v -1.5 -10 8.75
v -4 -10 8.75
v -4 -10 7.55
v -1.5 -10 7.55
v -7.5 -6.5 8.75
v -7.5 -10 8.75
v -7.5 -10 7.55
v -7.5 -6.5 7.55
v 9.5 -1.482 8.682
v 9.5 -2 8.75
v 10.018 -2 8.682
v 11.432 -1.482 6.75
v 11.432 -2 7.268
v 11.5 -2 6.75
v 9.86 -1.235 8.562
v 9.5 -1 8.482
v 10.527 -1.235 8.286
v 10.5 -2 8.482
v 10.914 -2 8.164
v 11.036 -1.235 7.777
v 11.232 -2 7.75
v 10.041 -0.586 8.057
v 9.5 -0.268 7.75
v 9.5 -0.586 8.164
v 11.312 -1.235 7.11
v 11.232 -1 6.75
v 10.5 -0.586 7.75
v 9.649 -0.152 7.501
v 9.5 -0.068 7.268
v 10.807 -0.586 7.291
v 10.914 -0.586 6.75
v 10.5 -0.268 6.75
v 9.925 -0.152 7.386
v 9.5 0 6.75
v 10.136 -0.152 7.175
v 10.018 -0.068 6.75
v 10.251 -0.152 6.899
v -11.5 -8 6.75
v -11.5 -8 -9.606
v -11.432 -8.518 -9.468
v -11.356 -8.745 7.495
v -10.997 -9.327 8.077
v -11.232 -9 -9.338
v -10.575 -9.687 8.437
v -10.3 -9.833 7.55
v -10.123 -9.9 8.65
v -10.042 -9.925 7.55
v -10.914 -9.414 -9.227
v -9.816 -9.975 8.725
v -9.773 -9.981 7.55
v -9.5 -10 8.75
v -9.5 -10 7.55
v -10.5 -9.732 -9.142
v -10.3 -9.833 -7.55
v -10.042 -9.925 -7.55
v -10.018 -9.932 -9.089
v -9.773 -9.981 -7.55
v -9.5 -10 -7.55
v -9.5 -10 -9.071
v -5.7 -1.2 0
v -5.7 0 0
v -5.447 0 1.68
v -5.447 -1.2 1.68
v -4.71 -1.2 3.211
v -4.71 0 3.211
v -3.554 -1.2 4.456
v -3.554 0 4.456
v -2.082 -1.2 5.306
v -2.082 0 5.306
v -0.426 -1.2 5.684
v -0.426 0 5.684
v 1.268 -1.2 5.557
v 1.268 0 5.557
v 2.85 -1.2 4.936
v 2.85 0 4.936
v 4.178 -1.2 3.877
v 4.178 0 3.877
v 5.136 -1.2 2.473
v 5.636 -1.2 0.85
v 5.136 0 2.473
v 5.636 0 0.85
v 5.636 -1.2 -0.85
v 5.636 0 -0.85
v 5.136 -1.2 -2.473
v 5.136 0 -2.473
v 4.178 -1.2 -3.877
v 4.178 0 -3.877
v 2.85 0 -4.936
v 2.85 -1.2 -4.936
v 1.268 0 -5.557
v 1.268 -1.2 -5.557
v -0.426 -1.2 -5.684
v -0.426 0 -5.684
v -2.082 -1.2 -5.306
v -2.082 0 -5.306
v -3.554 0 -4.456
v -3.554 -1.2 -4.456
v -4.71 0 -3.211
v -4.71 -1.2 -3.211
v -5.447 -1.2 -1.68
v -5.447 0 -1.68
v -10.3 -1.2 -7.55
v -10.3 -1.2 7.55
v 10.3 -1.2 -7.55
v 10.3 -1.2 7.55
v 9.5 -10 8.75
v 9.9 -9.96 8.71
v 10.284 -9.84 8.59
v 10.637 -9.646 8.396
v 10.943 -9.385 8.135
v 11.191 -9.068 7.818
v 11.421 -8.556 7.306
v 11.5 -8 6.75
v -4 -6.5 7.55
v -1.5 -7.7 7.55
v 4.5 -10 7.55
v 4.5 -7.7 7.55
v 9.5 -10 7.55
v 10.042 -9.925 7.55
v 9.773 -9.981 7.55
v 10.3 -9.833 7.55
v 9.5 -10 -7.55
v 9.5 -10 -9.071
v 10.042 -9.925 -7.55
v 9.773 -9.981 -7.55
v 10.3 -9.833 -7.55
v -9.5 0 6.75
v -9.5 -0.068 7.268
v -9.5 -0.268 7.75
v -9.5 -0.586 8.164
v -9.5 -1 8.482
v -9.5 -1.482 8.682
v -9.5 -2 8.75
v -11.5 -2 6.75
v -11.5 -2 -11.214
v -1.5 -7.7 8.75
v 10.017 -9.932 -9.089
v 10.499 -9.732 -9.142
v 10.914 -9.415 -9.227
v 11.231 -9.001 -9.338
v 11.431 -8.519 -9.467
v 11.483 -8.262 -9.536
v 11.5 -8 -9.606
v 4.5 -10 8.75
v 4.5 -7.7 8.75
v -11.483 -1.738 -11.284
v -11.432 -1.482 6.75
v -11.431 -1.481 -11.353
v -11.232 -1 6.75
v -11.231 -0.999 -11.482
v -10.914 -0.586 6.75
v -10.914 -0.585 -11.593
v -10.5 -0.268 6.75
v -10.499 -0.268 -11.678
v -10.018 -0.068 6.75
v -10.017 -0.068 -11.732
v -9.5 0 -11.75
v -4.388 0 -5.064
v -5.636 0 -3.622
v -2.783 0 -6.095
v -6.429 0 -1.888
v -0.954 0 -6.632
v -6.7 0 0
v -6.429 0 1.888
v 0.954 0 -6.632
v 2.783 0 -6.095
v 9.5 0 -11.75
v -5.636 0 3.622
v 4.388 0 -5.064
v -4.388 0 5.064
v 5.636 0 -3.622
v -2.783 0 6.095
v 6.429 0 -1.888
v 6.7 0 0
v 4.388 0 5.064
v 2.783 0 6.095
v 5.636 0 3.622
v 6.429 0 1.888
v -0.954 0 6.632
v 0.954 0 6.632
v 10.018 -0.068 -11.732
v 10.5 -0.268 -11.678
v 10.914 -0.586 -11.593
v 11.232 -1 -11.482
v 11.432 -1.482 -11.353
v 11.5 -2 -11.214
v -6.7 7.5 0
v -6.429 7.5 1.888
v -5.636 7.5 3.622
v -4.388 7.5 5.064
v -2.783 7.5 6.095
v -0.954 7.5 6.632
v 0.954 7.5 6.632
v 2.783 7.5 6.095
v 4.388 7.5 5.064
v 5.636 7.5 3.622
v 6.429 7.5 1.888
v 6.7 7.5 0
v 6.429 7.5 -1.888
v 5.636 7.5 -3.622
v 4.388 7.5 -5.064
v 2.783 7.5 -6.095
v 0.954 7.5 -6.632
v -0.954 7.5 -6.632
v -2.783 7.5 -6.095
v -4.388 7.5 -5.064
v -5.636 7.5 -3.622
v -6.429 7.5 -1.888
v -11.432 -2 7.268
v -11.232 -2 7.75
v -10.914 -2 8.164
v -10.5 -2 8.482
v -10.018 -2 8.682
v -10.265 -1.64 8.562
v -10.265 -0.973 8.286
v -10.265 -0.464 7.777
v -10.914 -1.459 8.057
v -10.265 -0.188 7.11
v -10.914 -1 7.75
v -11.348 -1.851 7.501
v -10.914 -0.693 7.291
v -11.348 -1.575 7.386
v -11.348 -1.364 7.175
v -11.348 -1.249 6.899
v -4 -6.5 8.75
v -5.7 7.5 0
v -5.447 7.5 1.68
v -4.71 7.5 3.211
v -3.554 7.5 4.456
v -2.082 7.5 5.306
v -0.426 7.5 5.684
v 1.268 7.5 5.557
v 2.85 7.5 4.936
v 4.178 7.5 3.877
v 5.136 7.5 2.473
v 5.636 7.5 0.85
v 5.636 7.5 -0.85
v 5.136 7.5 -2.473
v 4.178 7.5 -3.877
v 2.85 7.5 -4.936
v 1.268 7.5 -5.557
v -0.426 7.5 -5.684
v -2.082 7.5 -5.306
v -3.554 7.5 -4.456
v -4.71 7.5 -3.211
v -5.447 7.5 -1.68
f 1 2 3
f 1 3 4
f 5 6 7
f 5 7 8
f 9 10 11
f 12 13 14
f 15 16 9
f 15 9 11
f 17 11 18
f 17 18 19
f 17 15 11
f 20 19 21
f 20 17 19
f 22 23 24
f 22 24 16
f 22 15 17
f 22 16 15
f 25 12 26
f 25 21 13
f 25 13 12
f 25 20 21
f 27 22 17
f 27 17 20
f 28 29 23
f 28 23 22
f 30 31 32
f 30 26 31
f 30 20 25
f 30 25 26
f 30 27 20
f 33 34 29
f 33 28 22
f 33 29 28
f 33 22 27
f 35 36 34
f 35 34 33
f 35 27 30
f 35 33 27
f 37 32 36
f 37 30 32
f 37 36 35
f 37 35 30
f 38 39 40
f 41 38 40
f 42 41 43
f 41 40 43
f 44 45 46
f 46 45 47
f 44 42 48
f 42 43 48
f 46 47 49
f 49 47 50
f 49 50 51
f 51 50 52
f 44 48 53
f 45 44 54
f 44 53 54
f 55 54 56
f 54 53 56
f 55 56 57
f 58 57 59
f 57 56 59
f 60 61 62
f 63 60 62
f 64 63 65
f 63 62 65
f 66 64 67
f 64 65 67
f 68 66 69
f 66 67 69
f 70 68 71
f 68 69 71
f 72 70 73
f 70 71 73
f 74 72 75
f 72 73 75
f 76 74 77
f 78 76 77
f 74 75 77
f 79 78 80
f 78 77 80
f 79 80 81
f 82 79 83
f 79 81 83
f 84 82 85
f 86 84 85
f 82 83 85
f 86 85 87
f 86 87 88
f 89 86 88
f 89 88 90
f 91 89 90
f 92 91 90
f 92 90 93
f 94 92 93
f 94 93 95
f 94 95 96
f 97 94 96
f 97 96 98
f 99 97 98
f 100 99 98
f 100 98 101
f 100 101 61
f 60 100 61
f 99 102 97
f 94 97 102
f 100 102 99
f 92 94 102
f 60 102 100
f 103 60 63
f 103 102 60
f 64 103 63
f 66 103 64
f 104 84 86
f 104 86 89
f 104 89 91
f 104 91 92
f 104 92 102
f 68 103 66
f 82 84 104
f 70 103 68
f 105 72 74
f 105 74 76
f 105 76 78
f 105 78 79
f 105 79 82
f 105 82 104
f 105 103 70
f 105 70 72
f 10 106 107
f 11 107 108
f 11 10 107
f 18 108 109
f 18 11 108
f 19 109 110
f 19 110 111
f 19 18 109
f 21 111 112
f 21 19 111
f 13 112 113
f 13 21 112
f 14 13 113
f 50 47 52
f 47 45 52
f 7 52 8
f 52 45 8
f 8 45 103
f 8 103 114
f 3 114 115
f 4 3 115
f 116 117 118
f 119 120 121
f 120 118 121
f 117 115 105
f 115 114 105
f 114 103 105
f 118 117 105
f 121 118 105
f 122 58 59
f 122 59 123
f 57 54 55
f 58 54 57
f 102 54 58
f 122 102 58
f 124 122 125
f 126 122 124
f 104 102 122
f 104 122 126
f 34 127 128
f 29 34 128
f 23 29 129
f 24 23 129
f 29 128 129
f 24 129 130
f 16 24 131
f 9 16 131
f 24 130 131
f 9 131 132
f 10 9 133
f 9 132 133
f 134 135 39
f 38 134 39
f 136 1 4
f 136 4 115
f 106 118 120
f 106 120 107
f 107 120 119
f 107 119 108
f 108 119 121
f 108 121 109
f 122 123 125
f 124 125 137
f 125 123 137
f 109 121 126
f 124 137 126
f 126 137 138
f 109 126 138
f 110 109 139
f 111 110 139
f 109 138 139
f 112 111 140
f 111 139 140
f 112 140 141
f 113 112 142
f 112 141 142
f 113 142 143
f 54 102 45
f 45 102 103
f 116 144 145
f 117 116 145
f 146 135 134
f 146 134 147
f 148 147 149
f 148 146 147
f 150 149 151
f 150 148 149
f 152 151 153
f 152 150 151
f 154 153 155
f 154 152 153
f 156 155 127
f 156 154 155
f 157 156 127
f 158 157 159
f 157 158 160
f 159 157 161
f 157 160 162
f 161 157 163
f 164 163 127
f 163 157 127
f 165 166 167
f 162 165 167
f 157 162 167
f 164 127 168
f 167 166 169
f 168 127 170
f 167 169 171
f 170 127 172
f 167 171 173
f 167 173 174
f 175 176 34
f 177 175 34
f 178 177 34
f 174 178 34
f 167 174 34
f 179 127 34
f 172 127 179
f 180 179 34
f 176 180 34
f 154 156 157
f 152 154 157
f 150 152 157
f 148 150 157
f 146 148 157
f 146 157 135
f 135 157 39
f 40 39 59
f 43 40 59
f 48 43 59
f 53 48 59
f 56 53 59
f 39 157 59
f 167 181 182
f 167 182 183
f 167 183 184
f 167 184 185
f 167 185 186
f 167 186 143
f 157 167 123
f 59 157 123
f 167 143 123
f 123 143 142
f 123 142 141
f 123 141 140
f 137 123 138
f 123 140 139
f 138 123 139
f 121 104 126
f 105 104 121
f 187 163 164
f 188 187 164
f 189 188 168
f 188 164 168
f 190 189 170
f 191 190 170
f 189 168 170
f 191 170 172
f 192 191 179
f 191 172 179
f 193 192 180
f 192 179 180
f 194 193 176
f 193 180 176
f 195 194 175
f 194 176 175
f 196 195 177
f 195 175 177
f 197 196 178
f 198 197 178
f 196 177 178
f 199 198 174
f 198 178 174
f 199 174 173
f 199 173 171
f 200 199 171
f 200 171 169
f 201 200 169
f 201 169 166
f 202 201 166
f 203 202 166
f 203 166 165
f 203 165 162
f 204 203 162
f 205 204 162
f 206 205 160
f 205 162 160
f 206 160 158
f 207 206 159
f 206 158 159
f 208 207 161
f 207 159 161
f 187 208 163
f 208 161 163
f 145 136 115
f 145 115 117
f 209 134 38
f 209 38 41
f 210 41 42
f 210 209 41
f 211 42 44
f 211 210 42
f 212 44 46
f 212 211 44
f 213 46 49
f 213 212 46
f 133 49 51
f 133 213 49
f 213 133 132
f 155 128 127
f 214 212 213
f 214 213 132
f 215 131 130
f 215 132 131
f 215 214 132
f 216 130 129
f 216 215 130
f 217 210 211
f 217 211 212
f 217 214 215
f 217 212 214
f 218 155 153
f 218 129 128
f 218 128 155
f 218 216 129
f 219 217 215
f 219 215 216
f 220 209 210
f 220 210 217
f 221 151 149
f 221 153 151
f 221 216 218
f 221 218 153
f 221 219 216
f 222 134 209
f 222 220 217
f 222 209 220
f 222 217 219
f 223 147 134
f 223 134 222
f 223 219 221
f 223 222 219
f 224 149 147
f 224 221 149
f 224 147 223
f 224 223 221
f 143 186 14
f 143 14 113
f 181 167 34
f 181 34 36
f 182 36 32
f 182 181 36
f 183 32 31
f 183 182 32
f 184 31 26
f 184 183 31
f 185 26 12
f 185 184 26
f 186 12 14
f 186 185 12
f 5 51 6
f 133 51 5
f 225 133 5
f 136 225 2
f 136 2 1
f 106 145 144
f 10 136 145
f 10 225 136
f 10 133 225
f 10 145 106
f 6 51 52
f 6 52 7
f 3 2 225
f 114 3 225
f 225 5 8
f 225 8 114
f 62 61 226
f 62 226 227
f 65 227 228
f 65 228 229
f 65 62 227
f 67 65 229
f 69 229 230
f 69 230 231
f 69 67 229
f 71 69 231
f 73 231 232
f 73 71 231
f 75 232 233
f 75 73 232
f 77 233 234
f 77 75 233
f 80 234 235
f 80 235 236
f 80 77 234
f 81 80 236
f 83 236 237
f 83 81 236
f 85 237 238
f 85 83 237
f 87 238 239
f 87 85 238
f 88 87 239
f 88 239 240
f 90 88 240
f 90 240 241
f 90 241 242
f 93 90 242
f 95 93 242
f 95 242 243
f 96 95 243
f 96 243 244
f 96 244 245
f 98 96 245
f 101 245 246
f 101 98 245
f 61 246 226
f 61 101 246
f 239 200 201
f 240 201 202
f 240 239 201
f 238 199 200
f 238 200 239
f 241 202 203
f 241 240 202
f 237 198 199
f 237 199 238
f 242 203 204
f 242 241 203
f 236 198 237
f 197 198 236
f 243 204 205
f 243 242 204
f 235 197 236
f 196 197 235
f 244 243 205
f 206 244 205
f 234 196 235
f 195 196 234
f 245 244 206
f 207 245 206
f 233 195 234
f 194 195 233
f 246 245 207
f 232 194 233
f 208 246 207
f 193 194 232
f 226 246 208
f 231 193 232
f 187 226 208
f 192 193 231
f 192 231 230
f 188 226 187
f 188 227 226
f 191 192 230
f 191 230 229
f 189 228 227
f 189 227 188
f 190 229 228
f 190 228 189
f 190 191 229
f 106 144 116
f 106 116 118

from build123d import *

# Parameters (mm, degrees)
F0_W          = 23
F0_H          = 17.5
F1_DEPTH      = 10
F2_T          = -1.2
F3_R          = 5.7
F4_DEPTH      = 3
F3_R_2        = 6.7
F5_DEPTH      = 7.5
F6_W          = 6
F6_H          = 2.3
F6_W_2        = 3.5
F6_H_2        = 3.5
F7_DEPTH      = 4
F8_DEPTH      = 3
F10_DEPTH     = 30
F11_T1_DEPTH  = 19
F11_T3_DEPTH  = 23.5
F11_T5_DEPTH  = 13
F11_T7_DEPTH  = 27.8205080757
F11_S11_W     = 2
F11_S11_H     = 2
F11_T12_DEPTH = 2
F11_S17_W     = 2
F11_S17_H     = 2
F11_T18_DEPTH = 2


# Not quite as in the source:
# - a fillet or chamfer that OpenCascade refuses, or shapes differently, is made with other operations: its cross-section is extruded or revolved along the edge and cut away or added


with BuildPart() as f1:
    # F0 (on Front) → F1 (new body)
    with BuildSketch(Plane.XZ):
        Rectangle(F0_W, F0_H)
    extrude(amount=F1_DEPTH)

    # F2
    f2_openings = [f1.faces().sort_by_distance(p)[0] for p in [
        (0, -10, 0),
    ]]
    offset(amount=F2_T, openings=f2_openings)

    # F3 (on face) → F4 (cut)
    with BuildSketch(Plane(origin=(0, 0, 0), x_dir=(-1, 0, 0), z_dir=(0, 1, 0))):
        Circle(F3_R)
    extrude(amount=-F4_DEPTH, mode=Mode.SUBTRACT)

    # F3 (on face) → F5 (join)
    with BuildSketch(Plane(origin=(0, 0, 0), x_dir=(-1, 0, 0), z_dir=(0, 1, 0))):
        Circle(F3_R_2)
        Circle(F3_R, mode=Mode.SUBTRACT)
    extrude(amount=F5_DEPTH)

    # F6 (on face) → F7 (cut)
    with BuildSketch(Plane.XY.offset(8.75)):
        with Locations((1.5, -8.85)):
            Rectangle(F6_W, F6_H)
        with Locations((-5.75, -8.25)):
            Rectangle(F6_W_2, F6_H_2)
    extrude(amount=-F7_DEPTH, mode=Mode.SUBTRACT)

    # F8 (add): a face of the model
    f8_faces = [f1.faces().sort_by_distance(p)[0] for p in [
        (0, -5, -8.75),
    ]]
    extrude(f8_faces, amount=F8_DEPTH)

    # F9 (on face) → F10 (cut)
    with BuildSketch(Plane.YZ.offset(11.5)):
        Polygon((-10, -11.75), (0, -11.75), (-10, -9.0705080757), align=None)
    extrude(amount=-F10_DEPTH, mode=Mode.SUBTRACT)

    # F11: fillet of radius 2 on 7 edges, made by hand

    # F11_s2 → F11_t1 (cut)
    with BuildSketch(Plane.YZ.offset(-9.5)):
        with BuildLine():
            ThreePointArc((0, 6.75), (-0.5857864376, 8.1642135624), (-2, 8.75))
            Line((-2, 8.75), (0, 8.75))
            Line((0, 8.75), (0, 6.75))
        make_face()
    extrude(amount=F11_T1_DEPTH, mode=Mode.SUBTRACT)

    # F11_s4 → F11_t3 (cut)
    with BuildSketch(Plane.XY.offset(-16.75)):
        with BuildLine():
            ThreePointArc((-11.5, -2), (-10.9142135624, -0.5857864376), (-9.5, 0))
            Line((-9.5, 0), (-11.5, 0))
            Line((-11.5, 0), (-11.5, -2))
        make_face()
        with BuildLine():
            ThreePointArc((9.5, 0), (10.9142135624, -0.5857864376), (11.5, -2))
            Line((11.5, -2), (11.5, 0))
            Line((11.5, 0), (9.5, 0))
        make_face()
    extrude(amount=F11_T3_DEPTH, mode=Mode.SUBTRACT)

    # F11_s6 → F11_t5 (cut)
    with BuildSketch(Plane.XZ.offset(2)):
        with BuildLine():
            ThreePointArc((9.5, 8.75), (10.9142135624, 8.1642135624), (11.5, 6.75))
            Line((11.5, 6.75), (11.5, 8.75))
            Line((11.5, 8.75), (9.5, 8.75))
        make_face()
        with BuildLine():
            ThreePointArc((-11.5, 6.75), (-10.9142135624, 8.1642135624), (-9.5, 8.75))
            Line((-9.5, 8.75), (-11.5, 8.75))
            Line((-11.5, 8.75), (-11.5, 6.75))
        make_face()
    extrude(amount=F11_T5_DEPTH, mode=Mode.SUBTRACT)

    # F11_s8 → F11_t7 (cut)
    with BuildSketch(Plane.XY.offset(-14.0705080757)):
        with BuildLine():
            ThreePointArc((-11.5, -8), (-10.9142135624, -9.4142135624), (-9.5, -10))
            Line((-9.5, -10), (-11.5, -10))
            Line((-11.5, -10), (-11.5, -8))
        make_face()
        with BuildLine():
            ThreePointArc((9.5, -10), (10.9142135624, -9.4142135624), (11.5, -8))
            Line((11.5, -8), (11.5, -10))
            Line((11.5, -10), (9.5, -10))
        make_face()
    extrude(amount=F11_T7_DEPTH, mode=Mode.SUBTRACT)


with BuildPart() as f11_tool10:
    # F11_s11 → F11_t12 (new body)
    with BuildSketch(Plane.XZ.offset(2)):
        with Locations((10.5, 7.75)):
            Rectangle(F11_S11_W, F11_S11_H)
    extrude(amount=-F11_T12_DEPTH)

    # F11_s13 → F11_t14 (revolve, cut)
    with BuildSketch(Plane(origin=(9.5, -2, 6.75), x_dir=(-0.7071067812, 0, -0.7071067812), z_dir=(0.7071067812, 0, -0.7071067812))):
        with BuildLine():
            ThreePointArc((0, -2), (2, 0), (0, 2))
            Line((0, 2), (0, -2))
        make_face()
    revolve(axis=Axis((9.5, -2, 6.75), (0, 1, 0)), mode=Mode.SUBTRACT)


with BuildPart() as f1_1:
    add(f1.part)

    # F11_t9: cut F11_tool10
    add(f11_tool10.part, mode=Mode.SUBTRACT)


with BuildPart() as f11_tool16:
    # F11_s17 → F11_t18 (new body)
    with BuildSketch(Plane.YZ.offset(-9.5)):
        with Locations((-1, 7.75)):
            Rectangle(F11_S17_W, F11_S17_H)
    extrude(amount=-F11_T18_DEPTH)

    # F11_s19 → F11_t20 (revolve, cut)
    with BuildSketch(Plane(origin=(-9.5, -2, 6.75), x_dir=(0, -0.7071067812, -0.7071067812), z_dir=(0, 0.7071067812, -0.7071067812))):
        with BuildLine():
            ThreePointArc((0, -2), (2, 0), (0, 2))
            Line((0, 2), (0, -2))
        make_face()
    revolve(axis=Axis((-9.5, -2, 6.75), (-1, 0, 0)), mode=Mode.SUBTRACT)


with BuildPart() as f1_2:
    add(f1_1.part)

    # F11_t15: cut F11_tool16
    add(f11_tool16.part, mode=Mode.SUBTRACT)


solid = f1_2.part
